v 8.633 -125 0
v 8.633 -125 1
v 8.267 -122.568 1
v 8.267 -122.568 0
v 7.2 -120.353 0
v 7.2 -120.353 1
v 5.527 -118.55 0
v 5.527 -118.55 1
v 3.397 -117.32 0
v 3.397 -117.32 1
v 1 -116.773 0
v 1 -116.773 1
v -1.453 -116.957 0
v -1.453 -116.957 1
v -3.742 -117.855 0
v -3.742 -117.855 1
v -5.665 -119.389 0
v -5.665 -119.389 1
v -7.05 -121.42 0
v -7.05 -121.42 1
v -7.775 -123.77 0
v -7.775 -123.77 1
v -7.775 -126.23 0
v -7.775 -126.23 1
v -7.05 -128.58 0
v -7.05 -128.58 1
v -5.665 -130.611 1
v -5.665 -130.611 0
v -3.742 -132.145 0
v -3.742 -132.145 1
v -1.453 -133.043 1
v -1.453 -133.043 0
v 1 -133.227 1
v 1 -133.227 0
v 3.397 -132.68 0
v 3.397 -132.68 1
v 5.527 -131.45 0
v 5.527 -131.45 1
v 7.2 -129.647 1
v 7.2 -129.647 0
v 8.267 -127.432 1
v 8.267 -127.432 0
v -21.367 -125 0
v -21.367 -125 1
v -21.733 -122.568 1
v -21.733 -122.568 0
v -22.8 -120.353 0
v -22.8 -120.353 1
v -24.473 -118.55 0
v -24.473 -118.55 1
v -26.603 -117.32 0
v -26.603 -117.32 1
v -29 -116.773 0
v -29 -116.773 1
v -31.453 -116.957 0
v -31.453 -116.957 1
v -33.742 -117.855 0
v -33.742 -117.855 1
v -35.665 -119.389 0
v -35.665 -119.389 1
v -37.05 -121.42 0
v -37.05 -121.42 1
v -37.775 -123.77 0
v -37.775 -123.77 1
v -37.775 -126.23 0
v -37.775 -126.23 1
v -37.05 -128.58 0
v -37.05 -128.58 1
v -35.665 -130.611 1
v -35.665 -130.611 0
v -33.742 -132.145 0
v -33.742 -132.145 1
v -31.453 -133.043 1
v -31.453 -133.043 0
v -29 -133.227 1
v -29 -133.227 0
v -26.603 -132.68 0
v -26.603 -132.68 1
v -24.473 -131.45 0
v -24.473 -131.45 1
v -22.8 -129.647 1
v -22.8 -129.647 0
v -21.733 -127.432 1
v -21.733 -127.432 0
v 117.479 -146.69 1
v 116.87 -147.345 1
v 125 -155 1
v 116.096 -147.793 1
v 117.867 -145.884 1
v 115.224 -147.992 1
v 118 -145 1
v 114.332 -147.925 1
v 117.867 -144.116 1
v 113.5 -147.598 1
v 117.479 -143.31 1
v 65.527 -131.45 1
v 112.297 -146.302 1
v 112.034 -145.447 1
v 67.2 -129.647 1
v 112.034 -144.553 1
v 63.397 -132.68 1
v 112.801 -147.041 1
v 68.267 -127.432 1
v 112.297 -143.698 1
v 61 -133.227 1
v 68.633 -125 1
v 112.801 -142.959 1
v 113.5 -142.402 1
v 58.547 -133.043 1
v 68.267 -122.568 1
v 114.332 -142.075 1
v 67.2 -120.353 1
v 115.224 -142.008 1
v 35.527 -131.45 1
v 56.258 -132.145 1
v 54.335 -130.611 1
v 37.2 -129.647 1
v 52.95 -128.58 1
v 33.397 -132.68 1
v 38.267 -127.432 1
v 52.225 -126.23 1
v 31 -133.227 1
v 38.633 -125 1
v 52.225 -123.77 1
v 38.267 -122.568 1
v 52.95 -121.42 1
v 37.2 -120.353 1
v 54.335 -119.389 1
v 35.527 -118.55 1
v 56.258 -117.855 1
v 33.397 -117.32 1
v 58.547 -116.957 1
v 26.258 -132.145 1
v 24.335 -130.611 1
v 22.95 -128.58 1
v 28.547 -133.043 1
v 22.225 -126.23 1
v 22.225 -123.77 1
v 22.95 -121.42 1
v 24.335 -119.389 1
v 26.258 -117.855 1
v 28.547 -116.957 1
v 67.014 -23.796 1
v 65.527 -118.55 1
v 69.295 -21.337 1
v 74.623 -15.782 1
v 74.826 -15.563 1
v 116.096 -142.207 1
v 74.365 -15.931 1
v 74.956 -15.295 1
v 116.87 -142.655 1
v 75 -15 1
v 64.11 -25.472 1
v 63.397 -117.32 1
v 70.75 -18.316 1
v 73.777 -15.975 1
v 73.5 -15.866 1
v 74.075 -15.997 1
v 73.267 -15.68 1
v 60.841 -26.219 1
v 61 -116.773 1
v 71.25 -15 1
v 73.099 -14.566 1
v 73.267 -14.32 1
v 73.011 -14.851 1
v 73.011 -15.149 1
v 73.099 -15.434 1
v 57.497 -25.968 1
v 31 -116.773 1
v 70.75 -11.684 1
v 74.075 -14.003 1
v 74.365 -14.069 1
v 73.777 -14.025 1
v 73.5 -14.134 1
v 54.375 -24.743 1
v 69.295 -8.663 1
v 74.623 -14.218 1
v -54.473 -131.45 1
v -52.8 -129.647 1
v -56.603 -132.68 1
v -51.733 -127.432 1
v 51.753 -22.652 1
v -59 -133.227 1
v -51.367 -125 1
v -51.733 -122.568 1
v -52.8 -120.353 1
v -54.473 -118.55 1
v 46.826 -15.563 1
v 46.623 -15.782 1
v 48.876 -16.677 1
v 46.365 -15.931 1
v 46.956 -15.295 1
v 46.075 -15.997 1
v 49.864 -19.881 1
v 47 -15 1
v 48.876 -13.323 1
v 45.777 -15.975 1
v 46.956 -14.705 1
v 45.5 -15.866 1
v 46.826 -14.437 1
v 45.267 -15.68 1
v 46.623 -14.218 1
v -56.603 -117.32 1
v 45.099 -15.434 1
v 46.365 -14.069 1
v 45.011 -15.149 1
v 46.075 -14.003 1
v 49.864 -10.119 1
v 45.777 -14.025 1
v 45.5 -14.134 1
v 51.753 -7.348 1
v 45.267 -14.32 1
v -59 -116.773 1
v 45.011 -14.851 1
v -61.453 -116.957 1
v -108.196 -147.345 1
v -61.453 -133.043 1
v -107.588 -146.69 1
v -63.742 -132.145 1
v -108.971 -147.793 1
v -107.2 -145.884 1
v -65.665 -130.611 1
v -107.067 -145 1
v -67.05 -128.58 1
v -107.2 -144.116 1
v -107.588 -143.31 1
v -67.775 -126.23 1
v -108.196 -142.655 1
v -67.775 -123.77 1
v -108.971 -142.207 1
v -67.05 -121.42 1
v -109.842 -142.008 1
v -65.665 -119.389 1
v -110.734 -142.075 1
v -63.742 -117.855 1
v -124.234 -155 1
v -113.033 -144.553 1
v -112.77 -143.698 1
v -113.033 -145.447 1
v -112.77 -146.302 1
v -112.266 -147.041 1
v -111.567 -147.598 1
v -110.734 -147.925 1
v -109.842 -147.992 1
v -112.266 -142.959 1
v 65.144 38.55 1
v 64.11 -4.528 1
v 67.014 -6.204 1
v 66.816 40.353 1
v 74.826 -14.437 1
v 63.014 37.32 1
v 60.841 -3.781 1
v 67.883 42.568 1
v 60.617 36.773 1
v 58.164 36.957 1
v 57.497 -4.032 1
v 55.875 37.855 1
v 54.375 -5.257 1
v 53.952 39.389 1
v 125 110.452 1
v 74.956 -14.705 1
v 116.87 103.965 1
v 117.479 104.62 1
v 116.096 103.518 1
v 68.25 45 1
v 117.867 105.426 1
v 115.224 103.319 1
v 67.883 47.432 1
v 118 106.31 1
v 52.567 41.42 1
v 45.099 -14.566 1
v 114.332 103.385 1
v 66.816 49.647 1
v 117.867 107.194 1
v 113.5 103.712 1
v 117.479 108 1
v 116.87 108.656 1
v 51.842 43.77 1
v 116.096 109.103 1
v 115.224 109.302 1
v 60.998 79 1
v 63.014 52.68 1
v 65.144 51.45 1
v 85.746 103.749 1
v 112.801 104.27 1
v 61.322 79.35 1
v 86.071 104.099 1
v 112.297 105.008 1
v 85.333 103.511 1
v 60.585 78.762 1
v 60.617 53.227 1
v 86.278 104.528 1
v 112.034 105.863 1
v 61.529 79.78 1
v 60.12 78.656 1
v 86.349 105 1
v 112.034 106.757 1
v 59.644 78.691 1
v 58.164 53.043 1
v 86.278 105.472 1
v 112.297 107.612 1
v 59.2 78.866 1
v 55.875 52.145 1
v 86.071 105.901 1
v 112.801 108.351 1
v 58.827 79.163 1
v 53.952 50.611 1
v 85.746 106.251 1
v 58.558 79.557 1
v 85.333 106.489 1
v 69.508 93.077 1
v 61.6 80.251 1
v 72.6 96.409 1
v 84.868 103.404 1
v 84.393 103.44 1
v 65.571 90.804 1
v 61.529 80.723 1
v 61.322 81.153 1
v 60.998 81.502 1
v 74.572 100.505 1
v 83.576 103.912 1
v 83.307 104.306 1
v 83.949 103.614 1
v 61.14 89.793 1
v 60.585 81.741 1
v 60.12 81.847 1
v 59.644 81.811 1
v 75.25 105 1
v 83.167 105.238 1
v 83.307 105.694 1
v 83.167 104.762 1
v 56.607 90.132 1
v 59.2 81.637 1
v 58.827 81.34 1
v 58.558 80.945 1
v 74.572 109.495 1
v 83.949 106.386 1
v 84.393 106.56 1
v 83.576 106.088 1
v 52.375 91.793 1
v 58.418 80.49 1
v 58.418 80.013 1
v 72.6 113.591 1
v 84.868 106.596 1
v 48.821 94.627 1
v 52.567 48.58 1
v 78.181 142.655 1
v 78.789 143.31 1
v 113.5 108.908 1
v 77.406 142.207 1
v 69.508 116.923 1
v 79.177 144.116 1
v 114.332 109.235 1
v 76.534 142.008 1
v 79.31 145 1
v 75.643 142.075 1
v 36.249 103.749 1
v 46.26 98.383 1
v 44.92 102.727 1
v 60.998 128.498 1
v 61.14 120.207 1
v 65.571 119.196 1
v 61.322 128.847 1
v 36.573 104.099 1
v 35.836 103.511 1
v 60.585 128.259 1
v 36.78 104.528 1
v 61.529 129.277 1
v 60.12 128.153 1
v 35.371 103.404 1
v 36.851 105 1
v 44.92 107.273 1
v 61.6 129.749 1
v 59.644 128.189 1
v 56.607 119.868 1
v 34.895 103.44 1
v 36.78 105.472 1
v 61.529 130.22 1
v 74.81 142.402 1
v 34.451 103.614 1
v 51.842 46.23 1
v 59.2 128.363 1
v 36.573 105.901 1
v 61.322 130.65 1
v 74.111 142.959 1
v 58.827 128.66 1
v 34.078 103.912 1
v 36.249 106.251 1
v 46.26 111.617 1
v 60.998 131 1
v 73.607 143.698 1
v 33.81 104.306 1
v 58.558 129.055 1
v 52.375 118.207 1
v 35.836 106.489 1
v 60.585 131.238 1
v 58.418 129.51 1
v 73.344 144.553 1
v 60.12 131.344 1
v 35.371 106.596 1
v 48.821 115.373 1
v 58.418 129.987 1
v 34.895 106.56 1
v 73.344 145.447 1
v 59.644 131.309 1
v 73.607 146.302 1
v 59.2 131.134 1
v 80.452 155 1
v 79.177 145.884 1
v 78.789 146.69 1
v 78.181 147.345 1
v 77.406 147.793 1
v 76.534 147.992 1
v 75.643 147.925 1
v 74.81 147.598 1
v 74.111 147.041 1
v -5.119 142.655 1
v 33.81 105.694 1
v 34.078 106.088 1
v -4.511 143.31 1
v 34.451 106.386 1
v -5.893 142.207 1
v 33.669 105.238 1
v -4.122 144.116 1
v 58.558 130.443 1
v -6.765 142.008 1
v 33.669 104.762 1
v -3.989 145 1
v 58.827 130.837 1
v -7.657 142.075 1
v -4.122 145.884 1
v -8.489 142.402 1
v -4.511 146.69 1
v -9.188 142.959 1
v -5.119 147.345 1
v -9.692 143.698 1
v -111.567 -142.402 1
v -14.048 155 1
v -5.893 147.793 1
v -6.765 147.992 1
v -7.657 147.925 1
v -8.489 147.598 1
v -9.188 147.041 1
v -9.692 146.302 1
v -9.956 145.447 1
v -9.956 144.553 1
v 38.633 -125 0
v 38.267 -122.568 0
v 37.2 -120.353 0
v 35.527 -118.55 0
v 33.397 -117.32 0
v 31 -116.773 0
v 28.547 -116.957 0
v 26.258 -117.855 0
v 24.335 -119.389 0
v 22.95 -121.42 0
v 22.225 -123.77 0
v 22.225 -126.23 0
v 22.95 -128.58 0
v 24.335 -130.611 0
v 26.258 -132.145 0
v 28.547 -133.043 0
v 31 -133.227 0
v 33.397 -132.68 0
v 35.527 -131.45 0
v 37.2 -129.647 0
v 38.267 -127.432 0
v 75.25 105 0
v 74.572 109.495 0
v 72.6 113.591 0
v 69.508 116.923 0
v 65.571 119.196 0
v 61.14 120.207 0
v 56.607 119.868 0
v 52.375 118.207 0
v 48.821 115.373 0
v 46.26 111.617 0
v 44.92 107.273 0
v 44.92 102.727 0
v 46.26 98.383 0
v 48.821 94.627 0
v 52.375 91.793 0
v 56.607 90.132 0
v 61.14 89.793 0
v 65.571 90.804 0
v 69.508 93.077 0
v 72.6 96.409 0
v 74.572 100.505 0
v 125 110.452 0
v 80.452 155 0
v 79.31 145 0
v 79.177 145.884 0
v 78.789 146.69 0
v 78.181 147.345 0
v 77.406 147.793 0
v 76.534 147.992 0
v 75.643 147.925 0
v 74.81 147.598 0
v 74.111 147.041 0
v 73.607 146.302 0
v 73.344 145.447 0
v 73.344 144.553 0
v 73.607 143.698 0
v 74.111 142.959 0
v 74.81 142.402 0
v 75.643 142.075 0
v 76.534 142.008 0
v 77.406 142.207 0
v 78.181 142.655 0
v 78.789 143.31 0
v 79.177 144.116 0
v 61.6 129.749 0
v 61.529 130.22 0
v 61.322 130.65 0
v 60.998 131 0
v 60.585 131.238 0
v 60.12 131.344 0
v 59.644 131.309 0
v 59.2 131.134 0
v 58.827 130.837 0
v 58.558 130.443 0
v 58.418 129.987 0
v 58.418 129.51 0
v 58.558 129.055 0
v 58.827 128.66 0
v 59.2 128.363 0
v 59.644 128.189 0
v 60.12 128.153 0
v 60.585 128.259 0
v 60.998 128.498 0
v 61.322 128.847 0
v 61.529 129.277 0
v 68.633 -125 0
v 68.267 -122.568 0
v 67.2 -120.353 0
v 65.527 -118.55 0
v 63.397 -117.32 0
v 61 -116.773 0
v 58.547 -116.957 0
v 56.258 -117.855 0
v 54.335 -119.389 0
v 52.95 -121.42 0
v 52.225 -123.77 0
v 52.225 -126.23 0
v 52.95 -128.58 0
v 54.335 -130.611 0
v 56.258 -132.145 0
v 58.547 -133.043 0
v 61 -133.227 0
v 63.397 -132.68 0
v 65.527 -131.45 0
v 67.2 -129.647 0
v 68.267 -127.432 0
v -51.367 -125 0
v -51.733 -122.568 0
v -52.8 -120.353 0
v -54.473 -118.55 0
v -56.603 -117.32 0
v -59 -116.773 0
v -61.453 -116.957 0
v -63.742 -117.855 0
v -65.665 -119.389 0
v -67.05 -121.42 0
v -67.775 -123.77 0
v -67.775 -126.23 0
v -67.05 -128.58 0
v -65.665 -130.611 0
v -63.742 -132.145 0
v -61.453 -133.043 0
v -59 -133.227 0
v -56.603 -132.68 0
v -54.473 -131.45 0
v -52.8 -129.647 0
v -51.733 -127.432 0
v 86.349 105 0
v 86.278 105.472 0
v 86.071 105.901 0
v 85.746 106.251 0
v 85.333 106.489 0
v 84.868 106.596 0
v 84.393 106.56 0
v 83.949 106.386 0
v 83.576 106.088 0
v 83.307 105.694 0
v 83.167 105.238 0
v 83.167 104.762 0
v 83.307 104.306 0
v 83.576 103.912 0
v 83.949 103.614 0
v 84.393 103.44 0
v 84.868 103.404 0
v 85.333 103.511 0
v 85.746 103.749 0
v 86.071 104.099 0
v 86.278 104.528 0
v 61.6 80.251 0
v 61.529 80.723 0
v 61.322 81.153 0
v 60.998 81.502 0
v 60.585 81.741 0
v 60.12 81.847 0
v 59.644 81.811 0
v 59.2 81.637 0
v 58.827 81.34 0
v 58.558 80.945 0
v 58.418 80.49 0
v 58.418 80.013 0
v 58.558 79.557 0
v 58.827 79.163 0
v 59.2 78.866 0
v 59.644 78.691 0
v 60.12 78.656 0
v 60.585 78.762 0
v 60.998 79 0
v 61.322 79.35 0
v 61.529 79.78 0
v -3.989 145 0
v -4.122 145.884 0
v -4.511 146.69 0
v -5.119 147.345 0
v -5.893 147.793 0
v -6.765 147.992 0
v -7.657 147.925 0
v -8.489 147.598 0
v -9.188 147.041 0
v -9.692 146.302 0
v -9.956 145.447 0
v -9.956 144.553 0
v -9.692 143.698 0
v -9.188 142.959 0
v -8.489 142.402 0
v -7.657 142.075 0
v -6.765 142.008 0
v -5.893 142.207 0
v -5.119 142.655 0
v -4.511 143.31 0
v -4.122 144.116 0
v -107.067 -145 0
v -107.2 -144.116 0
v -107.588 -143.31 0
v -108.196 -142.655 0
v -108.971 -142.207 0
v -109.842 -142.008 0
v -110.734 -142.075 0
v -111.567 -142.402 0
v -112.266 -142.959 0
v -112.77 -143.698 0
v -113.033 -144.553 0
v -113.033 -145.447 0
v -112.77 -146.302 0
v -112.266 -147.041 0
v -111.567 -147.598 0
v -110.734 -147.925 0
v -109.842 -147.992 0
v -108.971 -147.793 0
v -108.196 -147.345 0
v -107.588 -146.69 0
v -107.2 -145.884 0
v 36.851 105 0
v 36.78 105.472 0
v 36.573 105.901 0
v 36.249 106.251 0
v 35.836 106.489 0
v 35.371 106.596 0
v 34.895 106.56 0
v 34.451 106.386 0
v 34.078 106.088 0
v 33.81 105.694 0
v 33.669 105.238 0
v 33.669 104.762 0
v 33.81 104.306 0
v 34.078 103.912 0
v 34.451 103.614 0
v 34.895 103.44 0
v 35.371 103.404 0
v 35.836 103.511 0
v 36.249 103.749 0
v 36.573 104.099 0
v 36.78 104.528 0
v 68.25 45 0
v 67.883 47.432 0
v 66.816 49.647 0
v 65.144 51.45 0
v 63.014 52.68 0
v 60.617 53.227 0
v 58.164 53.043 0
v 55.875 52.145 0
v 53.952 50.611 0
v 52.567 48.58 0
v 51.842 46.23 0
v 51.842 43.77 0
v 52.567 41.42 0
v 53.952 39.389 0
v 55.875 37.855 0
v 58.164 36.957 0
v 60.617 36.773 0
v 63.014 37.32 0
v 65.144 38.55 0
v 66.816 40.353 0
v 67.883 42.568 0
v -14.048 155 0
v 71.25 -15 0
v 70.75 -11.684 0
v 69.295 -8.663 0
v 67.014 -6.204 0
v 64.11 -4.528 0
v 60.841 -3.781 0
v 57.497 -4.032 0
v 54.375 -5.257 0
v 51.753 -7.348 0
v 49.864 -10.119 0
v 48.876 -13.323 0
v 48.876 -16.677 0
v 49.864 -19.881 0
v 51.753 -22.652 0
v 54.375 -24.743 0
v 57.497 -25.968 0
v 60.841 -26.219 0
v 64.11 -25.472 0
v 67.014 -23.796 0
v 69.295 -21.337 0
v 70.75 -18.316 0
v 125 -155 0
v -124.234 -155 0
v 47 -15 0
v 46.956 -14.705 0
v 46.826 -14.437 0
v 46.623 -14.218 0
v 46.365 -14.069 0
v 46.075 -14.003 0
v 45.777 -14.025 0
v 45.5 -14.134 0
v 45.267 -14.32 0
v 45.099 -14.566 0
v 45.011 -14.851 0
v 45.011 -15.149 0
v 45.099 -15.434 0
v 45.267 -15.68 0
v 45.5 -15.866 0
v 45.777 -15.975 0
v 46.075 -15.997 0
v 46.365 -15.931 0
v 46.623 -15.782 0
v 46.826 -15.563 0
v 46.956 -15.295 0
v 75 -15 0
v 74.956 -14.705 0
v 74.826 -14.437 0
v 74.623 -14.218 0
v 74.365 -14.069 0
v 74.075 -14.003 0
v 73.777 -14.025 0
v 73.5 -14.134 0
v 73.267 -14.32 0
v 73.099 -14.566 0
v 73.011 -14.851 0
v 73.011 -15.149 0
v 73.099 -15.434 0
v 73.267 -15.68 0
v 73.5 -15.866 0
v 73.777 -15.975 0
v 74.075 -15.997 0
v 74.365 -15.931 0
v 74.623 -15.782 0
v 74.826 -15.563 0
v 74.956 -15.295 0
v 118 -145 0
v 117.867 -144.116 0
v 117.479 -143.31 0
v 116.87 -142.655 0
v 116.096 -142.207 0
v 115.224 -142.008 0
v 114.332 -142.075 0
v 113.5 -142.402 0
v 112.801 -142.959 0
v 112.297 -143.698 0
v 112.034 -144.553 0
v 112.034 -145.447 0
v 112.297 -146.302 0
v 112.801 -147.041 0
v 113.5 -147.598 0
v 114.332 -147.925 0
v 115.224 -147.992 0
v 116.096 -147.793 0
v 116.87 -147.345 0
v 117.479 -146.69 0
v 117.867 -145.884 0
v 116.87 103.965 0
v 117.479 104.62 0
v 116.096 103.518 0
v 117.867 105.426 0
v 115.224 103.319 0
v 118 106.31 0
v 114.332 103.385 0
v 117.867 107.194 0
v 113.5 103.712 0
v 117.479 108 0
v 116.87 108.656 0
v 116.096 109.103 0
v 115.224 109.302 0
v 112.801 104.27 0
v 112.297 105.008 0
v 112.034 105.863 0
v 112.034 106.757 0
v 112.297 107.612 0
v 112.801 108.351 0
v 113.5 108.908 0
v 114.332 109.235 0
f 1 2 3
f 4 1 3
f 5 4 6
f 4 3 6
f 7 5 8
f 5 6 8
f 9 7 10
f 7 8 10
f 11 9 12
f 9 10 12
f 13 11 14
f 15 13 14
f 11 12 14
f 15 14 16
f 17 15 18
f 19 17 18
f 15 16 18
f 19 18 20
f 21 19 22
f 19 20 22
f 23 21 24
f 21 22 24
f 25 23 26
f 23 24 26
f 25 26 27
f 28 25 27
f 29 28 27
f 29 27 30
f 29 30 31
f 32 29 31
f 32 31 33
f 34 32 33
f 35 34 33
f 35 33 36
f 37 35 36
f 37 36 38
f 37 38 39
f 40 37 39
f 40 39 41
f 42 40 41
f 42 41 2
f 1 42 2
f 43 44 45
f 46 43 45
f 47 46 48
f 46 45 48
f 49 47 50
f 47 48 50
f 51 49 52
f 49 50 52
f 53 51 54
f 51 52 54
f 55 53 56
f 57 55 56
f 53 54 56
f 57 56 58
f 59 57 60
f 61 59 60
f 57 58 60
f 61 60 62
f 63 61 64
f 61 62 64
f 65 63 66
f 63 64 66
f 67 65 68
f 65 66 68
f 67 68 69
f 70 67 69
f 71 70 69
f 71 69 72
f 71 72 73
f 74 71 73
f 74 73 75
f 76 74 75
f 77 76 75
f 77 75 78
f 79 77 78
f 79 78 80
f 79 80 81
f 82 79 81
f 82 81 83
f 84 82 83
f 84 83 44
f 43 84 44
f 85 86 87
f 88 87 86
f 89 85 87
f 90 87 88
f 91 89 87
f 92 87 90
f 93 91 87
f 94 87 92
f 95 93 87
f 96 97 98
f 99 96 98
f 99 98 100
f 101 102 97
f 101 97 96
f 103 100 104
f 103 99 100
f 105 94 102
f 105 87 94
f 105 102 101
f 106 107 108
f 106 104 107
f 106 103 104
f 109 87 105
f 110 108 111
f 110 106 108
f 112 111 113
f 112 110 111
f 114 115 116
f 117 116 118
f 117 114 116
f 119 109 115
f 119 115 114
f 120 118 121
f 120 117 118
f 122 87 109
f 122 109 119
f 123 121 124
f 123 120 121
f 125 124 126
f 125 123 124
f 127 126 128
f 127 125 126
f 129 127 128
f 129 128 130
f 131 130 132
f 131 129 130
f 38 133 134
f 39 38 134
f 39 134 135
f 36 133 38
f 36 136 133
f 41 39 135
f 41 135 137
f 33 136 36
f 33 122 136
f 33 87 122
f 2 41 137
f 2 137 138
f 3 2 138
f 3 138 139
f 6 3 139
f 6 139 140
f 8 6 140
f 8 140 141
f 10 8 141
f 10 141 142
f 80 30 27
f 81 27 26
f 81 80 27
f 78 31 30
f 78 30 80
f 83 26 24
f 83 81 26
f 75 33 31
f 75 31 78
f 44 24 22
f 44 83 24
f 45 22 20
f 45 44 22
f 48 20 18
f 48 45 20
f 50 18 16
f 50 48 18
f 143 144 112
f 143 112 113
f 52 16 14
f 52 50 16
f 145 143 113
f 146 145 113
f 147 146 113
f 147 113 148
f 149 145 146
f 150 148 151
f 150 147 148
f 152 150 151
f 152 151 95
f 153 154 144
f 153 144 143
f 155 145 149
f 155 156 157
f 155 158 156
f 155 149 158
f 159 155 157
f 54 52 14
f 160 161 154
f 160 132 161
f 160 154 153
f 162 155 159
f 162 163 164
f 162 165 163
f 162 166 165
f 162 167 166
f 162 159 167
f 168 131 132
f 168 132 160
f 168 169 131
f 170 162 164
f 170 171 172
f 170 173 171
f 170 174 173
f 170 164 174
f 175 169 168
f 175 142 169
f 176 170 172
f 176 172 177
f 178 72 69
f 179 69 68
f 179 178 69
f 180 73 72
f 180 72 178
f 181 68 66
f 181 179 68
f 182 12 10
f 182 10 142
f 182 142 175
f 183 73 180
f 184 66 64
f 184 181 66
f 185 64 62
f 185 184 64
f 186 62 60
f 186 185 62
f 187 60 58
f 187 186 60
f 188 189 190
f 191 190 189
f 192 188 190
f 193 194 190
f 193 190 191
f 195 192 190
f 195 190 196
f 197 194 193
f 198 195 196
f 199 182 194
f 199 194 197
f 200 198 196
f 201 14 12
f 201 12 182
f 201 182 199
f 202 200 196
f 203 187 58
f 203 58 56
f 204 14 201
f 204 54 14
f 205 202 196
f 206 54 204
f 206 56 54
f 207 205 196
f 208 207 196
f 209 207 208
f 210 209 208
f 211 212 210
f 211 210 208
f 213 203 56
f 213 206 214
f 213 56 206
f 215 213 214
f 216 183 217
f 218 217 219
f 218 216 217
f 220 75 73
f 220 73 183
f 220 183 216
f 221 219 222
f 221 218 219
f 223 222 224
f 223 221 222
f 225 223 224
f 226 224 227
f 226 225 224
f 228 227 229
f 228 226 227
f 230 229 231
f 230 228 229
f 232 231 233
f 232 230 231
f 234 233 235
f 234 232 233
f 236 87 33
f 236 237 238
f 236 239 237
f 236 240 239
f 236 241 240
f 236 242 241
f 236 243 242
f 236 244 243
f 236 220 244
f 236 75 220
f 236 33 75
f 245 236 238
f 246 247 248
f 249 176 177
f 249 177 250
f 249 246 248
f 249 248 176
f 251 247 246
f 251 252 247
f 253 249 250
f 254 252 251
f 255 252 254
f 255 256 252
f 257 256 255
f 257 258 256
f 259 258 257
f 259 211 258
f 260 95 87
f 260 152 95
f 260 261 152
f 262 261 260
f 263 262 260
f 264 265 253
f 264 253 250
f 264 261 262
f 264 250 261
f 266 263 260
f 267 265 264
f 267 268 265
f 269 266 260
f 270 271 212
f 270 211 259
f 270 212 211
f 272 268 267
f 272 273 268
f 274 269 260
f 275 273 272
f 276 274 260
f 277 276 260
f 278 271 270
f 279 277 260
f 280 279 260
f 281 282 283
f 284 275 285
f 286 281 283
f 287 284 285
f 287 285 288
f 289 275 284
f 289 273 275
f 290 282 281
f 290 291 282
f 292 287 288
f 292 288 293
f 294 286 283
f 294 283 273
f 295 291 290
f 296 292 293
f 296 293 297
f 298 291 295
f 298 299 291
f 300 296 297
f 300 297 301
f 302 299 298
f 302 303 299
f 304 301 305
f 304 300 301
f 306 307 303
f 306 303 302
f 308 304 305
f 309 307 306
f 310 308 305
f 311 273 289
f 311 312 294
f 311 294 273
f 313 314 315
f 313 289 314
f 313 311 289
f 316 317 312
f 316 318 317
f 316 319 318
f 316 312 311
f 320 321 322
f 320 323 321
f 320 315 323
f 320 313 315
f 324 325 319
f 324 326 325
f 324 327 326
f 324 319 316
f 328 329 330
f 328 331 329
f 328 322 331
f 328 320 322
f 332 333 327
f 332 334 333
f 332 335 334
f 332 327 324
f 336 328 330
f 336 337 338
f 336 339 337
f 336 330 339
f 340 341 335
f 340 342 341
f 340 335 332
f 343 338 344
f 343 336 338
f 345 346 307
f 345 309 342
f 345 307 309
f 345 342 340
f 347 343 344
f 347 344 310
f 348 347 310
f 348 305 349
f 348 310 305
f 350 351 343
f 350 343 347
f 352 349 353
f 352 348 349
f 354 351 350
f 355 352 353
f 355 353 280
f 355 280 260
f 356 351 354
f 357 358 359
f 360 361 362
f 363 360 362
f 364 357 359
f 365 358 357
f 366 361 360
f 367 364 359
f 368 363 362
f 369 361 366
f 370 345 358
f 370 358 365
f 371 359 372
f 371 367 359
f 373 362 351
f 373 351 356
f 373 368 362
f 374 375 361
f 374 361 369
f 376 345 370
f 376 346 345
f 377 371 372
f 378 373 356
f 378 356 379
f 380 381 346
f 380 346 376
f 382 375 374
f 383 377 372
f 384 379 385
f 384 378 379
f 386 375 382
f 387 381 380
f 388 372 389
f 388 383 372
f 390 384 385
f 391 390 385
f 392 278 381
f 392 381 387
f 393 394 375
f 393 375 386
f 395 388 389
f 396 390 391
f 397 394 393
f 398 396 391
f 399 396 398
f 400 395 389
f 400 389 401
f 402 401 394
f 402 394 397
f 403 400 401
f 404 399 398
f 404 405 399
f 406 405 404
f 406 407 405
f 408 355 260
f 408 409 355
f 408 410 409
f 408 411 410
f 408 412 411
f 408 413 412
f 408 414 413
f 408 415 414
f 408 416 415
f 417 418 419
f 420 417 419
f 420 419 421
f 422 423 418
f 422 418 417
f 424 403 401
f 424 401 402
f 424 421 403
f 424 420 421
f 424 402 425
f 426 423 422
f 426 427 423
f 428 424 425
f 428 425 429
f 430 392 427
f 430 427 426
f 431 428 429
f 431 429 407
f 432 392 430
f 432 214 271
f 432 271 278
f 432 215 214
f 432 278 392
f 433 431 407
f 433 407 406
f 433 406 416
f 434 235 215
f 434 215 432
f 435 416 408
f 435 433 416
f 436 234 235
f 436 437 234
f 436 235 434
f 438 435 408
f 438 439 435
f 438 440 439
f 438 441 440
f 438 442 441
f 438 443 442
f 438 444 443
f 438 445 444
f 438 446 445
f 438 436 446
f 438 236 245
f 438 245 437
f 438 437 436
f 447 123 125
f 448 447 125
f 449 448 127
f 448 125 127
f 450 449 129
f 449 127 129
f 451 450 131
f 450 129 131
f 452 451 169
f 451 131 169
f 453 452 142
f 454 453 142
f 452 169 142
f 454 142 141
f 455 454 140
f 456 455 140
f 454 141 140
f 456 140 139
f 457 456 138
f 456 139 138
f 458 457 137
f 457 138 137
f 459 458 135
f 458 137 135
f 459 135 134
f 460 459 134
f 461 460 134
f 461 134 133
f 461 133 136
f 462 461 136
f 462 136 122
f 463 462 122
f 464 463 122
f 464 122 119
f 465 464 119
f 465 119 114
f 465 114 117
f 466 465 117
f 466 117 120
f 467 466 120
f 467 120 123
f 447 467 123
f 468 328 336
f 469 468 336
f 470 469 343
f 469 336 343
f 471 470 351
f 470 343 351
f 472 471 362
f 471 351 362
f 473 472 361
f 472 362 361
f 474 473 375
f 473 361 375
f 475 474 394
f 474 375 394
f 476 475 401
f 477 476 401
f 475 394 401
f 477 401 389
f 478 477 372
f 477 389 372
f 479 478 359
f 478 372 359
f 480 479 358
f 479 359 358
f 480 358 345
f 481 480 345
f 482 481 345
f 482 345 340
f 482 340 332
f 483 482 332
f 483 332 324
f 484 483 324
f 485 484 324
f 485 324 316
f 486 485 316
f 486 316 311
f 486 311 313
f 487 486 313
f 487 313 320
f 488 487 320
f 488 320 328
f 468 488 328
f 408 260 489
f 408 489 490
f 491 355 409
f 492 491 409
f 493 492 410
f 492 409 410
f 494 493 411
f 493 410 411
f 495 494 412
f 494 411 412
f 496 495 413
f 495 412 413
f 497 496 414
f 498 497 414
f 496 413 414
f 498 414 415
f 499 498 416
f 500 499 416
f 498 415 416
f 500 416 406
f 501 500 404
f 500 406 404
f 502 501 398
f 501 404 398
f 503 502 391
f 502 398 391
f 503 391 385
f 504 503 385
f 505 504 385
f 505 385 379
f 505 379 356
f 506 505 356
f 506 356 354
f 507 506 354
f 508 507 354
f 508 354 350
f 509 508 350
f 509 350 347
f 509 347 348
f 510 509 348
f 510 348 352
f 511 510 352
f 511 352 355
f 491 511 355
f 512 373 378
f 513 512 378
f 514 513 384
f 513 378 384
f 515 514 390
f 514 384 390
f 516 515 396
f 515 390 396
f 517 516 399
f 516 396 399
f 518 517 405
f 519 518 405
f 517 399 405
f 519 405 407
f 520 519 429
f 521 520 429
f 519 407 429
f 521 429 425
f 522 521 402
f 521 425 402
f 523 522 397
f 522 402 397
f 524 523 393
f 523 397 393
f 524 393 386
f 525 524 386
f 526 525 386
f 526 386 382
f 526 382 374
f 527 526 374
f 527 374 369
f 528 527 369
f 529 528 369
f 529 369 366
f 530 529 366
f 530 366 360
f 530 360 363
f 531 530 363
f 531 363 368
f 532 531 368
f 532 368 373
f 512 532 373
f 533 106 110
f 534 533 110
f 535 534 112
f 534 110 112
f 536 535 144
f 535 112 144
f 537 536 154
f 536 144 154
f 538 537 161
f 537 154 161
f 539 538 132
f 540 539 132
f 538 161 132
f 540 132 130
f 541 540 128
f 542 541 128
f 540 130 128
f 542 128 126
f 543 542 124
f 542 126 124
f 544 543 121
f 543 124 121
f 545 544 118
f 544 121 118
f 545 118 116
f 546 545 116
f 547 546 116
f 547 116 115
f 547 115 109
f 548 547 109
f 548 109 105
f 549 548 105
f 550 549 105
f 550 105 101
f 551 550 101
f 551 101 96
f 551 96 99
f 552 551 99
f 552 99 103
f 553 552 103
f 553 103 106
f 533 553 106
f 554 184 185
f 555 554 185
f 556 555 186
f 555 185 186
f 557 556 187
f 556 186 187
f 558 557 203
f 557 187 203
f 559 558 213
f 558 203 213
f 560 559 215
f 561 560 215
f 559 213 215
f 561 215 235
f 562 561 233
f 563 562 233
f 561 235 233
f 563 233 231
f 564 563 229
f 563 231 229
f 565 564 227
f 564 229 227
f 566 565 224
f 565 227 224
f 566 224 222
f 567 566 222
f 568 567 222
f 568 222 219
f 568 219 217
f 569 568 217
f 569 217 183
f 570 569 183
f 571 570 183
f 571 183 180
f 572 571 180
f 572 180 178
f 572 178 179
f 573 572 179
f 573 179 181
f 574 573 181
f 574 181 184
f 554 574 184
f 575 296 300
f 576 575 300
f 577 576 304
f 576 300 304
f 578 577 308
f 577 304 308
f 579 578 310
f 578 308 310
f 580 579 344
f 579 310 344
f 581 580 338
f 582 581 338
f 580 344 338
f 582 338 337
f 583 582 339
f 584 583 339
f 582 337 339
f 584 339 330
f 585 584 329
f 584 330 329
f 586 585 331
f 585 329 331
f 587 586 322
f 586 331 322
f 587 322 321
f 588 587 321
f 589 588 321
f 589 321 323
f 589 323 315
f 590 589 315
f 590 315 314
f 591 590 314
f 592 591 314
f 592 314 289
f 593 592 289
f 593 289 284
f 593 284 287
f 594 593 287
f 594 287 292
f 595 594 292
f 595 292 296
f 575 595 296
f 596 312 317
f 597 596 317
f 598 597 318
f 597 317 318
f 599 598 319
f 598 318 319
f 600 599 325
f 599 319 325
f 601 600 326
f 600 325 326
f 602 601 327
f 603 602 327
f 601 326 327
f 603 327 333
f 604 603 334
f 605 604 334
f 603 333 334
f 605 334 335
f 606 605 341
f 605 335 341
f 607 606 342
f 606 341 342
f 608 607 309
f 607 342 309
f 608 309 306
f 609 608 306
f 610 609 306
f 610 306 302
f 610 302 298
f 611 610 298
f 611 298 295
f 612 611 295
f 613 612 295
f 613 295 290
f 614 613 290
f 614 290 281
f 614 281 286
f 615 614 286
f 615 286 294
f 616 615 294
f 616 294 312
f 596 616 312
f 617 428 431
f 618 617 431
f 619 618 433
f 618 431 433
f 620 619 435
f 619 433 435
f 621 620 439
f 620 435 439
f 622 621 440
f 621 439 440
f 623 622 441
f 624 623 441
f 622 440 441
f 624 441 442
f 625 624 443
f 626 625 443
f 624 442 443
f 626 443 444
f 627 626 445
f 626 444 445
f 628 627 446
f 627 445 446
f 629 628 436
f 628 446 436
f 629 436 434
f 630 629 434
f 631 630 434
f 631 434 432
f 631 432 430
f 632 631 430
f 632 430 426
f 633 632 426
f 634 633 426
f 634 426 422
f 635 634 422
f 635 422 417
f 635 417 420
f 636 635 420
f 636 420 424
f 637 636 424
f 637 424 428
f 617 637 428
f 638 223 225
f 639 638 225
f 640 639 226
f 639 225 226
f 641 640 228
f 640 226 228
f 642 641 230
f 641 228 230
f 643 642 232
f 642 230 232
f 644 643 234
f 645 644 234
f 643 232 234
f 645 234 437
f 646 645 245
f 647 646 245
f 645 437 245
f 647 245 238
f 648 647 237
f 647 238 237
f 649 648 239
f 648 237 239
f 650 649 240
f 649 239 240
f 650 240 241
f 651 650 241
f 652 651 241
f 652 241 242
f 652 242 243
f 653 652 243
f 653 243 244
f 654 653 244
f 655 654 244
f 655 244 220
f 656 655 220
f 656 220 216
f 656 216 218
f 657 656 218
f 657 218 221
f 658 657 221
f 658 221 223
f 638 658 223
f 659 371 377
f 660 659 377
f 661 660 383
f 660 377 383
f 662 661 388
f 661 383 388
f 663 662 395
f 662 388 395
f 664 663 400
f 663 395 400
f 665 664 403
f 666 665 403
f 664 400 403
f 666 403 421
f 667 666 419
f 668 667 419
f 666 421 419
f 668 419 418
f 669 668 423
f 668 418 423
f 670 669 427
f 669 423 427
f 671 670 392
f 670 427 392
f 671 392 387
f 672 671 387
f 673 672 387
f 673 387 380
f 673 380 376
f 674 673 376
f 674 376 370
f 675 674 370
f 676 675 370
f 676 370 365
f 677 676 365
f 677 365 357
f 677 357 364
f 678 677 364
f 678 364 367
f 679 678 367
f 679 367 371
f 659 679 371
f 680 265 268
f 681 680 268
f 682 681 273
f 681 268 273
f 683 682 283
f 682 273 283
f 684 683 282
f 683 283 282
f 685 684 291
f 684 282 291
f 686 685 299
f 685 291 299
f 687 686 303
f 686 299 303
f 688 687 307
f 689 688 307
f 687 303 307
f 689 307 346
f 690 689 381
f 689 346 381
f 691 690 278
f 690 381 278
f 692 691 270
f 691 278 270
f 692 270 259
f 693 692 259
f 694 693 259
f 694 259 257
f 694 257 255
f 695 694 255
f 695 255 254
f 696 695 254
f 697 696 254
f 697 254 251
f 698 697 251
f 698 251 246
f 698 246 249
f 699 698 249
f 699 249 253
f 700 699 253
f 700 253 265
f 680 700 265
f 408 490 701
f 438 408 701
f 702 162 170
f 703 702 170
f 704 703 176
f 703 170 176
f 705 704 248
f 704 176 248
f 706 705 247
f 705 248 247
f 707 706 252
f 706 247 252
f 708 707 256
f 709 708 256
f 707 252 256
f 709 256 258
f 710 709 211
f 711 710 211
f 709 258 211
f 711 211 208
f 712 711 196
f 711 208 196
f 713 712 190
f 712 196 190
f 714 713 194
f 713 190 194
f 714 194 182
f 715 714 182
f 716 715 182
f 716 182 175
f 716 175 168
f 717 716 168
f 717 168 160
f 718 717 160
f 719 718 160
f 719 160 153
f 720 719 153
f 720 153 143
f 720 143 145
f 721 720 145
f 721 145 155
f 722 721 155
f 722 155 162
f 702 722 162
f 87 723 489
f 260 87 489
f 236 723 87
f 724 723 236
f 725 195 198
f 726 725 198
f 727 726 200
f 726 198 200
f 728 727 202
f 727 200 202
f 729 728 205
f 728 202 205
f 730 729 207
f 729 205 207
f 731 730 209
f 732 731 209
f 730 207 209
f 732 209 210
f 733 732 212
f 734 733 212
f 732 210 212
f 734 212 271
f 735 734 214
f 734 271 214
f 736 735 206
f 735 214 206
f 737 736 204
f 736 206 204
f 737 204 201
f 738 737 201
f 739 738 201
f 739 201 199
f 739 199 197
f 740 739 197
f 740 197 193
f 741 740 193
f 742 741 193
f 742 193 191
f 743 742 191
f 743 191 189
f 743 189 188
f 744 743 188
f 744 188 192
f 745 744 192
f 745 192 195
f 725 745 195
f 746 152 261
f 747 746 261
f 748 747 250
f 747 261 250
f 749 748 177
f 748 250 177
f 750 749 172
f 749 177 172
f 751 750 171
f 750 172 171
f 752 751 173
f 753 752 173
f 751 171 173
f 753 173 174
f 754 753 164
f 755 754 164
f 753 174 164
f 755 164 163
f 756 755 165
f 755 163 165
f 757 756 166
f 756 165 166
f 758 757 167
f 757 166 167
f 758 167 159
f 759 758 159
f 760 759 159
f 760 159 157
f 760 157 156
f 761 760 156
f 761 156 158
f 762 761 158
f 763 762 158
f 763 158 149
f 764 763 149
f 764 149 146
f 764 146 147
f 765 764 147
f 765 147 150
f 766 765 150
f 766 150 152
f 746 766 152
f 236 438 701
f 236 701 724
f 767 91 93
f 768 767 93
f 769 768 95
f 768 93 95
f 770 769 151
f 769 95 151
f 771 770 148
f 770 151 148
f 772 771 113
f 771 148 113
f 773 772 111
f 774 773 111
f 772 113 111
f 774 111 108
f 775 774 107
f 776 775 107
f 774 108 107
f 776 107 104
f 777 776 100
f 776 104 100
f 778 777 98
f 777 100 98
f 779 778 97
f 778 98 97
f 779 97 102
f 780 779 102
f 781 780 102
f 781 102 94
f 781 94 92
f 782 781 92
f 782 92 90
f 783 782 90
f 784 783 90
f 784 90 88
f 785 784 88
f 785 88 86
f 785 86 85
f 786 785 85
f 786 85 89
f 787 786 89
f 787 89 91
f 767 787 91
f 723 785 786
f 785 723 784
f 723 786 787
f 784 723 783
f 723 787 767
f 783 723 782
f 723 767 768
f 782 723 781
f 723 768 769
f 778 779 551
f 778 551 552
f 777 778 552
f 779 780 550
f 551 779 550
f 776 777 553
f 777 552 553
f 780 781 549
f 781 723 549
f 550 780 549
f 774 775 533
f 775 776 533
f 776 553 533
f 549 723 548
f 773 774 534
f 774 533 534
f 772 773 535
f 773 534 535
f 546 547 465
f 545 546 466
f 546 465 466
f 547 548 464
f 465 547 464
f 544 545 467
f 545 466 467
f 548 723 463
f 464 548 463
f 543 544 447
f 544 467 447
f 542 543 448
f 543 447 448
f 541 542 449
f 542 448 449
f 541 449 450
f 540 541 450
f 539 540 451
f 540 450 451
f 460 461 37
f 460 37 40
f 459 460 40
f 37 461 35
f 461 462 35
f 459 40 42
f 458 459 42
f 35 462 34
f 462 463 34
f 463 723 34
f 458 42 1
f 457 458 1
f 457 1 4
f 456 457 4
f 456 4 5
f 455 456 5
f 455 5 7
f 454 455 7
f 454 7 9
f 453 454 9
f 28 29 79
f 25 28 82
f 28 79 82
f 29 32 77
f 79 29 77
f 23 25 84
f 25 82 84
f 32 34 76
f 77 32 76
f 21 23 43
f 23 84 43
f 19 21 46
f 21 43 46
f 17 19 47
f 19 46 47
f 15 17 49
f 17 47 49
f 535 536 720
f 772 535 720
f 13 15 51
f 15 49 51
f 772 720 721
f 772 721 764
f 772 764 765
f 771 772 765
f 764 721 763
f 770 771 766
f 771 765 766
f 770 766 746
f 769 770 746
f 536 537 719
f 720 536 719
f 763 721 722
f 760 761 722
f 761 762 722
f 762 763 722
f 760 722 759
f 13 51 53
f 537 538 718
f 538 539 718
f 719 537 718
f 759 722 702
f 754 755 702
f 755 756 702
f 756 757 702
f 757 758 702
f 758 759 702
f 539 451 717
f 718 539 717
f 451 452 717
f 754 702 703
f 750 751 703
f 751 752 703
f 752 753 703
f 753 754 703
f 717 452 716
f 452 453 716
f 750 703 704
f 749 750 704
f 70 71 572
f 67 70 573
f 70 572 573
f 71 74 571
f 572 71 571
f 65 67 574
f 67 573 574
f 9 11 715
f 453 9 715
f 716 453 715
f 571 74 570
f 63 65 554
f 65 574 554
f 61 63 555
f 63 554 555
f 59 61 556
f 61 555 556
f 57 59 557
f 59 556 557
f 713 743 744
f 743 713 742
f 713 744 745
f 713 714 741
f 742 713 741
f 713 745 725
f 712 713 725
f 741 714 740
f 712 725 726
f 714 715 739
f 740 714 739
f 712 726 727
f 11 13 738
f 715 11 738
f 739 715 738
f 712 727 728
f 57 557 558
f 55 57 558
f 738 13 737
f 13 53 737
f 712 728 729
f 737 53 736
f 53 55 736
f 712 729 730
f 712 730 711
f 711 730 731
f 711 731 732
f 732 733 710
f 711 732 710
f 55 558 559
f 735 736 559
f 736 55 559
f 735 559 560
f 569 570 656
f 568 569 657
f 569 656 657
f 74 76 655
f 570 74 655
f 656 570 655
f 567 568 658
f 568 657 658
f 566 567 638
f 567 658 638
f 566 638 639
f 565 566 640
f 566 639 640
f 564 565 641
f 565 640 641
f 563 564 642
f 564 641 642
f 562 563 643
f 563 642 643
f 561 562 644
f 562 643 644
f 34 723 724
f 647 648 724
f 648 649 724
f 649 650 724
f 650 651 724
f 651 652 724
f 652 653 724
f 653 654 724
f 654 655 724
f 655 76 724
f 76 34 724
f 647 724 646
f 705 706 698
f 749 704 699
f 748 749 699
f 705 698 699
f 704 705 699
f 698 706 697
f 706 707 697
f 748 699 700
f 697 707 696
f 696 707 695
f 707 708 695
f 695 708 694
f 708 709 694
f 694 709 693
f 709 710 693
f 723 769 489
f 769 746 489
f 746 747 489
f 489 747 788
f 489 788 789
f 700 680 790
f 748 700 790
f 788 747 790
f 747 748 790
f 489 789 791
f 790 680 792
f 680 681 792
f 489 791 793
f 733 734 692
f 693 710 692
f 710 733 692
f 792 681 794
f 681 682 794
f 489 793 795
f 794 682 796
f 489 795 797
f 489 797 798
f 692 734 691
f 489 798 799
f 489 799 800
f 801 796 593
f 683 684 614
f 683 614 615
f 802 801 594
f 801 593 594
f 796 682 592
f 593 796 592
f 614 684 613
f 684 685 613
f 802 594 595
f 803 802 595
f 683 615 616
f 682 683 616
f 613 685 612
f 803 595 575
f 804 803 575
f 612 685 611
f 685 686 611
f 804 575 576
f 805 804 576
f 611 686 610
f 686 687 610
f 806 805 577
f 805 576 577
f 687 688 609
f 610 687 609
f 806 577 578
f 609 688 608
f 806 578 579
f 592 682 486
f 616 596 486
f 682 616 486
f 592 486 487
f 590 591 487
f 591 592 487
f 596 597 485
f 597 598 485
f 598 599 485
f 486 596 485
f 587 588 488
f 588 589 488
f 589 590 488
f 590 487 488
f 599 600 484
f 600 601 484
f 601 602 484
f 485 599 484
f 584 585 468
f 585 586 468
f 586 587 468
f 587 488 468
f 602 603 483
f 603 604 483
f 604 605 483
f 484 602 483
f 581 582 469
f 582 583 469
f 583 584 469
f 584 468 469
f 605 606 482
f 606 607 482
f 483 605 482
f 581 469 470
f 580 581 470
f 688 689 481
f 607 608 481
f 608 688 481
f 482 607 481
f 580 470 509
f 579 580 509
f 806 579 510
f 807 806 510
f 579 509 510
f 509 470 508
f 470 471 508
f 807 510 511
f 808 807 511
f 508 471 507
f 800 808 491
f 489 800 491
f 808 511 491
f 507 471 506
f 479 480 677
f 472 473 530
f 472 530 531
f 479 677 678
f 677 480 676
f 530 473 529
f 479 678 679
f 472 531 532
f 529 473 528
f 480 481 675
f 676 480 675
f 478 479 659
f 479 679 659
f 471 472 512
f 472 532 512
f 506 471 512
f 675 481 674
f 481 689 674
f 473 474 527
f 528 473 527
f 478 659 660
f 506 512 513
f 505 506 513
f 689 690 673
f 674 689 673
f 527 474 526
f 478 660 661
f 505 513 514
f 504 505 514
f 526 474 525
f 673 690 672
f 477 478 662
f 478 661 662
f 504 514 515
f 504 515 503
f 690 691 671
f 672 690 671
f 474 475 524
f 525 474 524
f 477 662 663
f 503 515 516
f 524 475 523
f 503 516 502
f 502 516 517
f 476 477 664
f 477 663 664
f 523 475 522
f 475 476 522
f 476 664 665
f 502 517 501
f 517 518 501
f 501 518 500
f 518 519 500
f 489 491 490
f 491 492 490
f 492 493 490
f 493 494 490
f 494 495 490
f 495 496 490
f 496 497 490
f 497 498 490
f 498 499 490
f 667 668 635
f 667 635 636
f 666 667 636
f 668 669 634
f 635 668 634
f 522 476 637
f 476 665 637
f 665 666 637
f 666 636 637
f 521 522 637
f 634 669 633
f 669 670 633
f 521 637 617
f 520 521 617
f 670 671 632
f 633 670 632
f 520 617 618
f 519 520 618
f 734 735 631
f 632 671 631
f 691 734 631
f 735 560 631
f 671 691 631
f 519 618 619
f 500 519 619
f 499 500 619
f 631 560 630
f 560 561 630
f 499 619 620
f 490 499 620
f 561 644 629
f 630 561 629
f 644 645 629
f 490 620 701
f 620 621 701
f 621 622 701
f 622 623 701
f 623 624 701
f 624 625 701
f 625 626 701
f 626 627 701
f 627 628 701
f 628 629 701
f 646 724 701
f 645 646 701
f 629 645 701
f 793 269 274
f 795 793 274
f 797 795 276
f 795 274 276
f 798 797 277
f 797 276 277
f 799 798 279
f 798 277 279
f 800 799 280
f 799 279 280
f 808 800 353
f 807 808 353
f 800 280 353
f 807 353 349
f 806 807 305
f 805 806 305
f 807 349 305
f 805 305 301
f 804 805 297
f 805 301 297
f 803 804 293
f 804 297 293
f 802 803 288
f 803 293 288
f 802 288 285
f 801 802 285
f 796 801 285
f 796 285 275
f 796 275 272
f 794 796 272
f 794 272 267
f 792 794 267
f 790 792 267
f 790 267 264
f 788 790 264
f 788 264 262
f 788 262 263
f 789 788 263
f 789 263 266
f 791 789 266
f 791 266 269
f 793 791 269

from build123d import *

# Parameters (mm, degrees)
SKETCH1_W           = 310
SKETCH1_H           = 250
BOSS_EXTRUDE1_DEPTH = 1
SKETCH2_OUTSIDE_W   = 391.65
SKETCH2_OUTSIDE_H   = 331.65
CUT_EXTRUDE1_DEPTH  = 200.125588511
SKETCH3_R           = 15.25
SKETCH3_R_2         = 8.25
SKETCH3_R_3         = 11.25
SKETCH3_R_4         = 1.6
SKETCH3_R_5         = 1
CUT_EXTRUDE2_DEPTH  = 200.125588511
SKETCH4_R           = 8.25
CUT_EXTRUDE3_DEPTH  = 200.125588511
SKETCH5_R           = 3
CUT_EXTRUDE4_DEPTH  = 200.125588511


with BuildPart() as part:
    # Sketch1 → Boss-Extrude1 (new body)
    with BuildSketch(Plane(origin=(0, 0, 0), x_dir=(0, 1, 0), z_dir=(0, 0, 1))):
        Rectangle(SKETCH1_W, SKETCH1_H)
    extrude(amount=BOSS_EXTRUDE1_DEPTH)

    # Sketch2 outside → Cut-Extrude1 (cut, through all)
    with BuildSketch(Plane(origin=(0, 0, 1), x_dir=(0, -1, 0), z_dir=(0, 0, 1))):
        Rectangle(SKETCH2_OUTSIDE_W, SKETCH2_OUTSIDE_H)
        Polygon((-155, -14.047727215), (155, -124.233933248), (155, 125), (-110.452272785, 125), (-155, 80.452272785), align=None, mode=Mode.SUBTRACT)
    extrude(amount=-CUT_EXTRUDE1_DEPTH, mode=Mode.SUBTRACT)

    # Sketch3 → Cut-Extrude2 (cut, through all)
    with BuildSketch(Plane(origin=(0, 0, 1), x_dir=(0, -1, 0), z_dir=(0, 0, 1))):
        with Locations(Location((-105, 60, 0), (0, 0, 90))):
            Circle(SKETCH3_R)
        with Locations(Location((-45, 60, 0), (0, 0, 90))):
            Circle(SKETCH3_R_2)
        with Locations(Location((15, 60, 0), (0, 0, 90))):
            Circle(SKETCH3_R_3)
        with Locations(Location((-105, 35.251262658, 0), (0, 0, 90))):
            Circle(SKETCH3_R_4)
        with Locations(Location((-129.748737342, 60, 0), (0, 0, 90))):
            Circle(SKETCH3_R_4)
        with Locations(Location((-105, 84.748737342, 0), (0, 0, 90))):
            Circle(SKETCH3_R_4)
        with Locations(Location((-80.251262658, 60, 0), (0, 0, 90))):
            Circle(SKETCH3_R_4)
        with Locations(Location((15, 74, 0), (0, 0, 90))):
            Circle(SKETCH3_R_5)
        with Locations(Location((15, 46, 0), (0, 0, 90))):
            Circle(SKETCH3_R_5)
    extrude(amount=-CUT_EXTRUDE2_DEPTH, mode=Mode.SUBTRACT)

    # Sketch4 → Cut-Extrude3 (cut, through all)
    with BuildSketch(Plane(origin=(0, 0, 1), x_dir=(0, -1, 0), z_dir=(0, 0, 1))):
        with Locations(Location((125, -59.616966624, 0), (0, 0, 90))):
            Circle(SKETCH4_R)
        with Locations(Location((125, -29.616966624, 0), (0, 0, 90))):
            Circle(SKETCH4_R)
        with Locations(Location((125, 0.383033376, 0), (0, 0, 90))):
            Circle(SKETCH4_R)
        with Locations(Location((125, 30.383033376, 0), (0, 0, 90))):
            Circle(SKETCH4_R)
        with Locations(Location((125, 60.383033376, 0), (0, 0, 90))):
            Circle(SKETCH4_R)
    extrude(amount=-CUT_EXTRUDE3_DEPTH, mode=Mode.SUBTRACT)

    # Sketch5 → Cut-Extrude4 (cut, through all)
    with BuildSketch(Plane(origin=(0, 0, 1), x_dir=(0, -1, 0), z_dir=(0, 0, 1))):
        with Locations(Location((145, -110.066636279, 0), (0, 0, 90))):
            Circle(SKETCH5_R)
        with Locations(Location((-145, -6.989217732, 0), (0, 0, 90))):
            Circle(SKETCH5_R)
        with Locations(Location((-145, 76.310137162, 0), (0, 0, 90))):
            Circle(SKETCH5_R)
        with Locations(Location((145, 115, 0), (0, 0, 90))):
            Circle(SKETCH5_R)
        with Locations(Location((-106.310137162, 115, 0), (0, 0, 90))):
            Circle(SKETCH5_R)
    extrude(amount=-CUT_EXTRUDE4_DEPTH, mode=Mode.SUBTRACT)


solid = part.part
